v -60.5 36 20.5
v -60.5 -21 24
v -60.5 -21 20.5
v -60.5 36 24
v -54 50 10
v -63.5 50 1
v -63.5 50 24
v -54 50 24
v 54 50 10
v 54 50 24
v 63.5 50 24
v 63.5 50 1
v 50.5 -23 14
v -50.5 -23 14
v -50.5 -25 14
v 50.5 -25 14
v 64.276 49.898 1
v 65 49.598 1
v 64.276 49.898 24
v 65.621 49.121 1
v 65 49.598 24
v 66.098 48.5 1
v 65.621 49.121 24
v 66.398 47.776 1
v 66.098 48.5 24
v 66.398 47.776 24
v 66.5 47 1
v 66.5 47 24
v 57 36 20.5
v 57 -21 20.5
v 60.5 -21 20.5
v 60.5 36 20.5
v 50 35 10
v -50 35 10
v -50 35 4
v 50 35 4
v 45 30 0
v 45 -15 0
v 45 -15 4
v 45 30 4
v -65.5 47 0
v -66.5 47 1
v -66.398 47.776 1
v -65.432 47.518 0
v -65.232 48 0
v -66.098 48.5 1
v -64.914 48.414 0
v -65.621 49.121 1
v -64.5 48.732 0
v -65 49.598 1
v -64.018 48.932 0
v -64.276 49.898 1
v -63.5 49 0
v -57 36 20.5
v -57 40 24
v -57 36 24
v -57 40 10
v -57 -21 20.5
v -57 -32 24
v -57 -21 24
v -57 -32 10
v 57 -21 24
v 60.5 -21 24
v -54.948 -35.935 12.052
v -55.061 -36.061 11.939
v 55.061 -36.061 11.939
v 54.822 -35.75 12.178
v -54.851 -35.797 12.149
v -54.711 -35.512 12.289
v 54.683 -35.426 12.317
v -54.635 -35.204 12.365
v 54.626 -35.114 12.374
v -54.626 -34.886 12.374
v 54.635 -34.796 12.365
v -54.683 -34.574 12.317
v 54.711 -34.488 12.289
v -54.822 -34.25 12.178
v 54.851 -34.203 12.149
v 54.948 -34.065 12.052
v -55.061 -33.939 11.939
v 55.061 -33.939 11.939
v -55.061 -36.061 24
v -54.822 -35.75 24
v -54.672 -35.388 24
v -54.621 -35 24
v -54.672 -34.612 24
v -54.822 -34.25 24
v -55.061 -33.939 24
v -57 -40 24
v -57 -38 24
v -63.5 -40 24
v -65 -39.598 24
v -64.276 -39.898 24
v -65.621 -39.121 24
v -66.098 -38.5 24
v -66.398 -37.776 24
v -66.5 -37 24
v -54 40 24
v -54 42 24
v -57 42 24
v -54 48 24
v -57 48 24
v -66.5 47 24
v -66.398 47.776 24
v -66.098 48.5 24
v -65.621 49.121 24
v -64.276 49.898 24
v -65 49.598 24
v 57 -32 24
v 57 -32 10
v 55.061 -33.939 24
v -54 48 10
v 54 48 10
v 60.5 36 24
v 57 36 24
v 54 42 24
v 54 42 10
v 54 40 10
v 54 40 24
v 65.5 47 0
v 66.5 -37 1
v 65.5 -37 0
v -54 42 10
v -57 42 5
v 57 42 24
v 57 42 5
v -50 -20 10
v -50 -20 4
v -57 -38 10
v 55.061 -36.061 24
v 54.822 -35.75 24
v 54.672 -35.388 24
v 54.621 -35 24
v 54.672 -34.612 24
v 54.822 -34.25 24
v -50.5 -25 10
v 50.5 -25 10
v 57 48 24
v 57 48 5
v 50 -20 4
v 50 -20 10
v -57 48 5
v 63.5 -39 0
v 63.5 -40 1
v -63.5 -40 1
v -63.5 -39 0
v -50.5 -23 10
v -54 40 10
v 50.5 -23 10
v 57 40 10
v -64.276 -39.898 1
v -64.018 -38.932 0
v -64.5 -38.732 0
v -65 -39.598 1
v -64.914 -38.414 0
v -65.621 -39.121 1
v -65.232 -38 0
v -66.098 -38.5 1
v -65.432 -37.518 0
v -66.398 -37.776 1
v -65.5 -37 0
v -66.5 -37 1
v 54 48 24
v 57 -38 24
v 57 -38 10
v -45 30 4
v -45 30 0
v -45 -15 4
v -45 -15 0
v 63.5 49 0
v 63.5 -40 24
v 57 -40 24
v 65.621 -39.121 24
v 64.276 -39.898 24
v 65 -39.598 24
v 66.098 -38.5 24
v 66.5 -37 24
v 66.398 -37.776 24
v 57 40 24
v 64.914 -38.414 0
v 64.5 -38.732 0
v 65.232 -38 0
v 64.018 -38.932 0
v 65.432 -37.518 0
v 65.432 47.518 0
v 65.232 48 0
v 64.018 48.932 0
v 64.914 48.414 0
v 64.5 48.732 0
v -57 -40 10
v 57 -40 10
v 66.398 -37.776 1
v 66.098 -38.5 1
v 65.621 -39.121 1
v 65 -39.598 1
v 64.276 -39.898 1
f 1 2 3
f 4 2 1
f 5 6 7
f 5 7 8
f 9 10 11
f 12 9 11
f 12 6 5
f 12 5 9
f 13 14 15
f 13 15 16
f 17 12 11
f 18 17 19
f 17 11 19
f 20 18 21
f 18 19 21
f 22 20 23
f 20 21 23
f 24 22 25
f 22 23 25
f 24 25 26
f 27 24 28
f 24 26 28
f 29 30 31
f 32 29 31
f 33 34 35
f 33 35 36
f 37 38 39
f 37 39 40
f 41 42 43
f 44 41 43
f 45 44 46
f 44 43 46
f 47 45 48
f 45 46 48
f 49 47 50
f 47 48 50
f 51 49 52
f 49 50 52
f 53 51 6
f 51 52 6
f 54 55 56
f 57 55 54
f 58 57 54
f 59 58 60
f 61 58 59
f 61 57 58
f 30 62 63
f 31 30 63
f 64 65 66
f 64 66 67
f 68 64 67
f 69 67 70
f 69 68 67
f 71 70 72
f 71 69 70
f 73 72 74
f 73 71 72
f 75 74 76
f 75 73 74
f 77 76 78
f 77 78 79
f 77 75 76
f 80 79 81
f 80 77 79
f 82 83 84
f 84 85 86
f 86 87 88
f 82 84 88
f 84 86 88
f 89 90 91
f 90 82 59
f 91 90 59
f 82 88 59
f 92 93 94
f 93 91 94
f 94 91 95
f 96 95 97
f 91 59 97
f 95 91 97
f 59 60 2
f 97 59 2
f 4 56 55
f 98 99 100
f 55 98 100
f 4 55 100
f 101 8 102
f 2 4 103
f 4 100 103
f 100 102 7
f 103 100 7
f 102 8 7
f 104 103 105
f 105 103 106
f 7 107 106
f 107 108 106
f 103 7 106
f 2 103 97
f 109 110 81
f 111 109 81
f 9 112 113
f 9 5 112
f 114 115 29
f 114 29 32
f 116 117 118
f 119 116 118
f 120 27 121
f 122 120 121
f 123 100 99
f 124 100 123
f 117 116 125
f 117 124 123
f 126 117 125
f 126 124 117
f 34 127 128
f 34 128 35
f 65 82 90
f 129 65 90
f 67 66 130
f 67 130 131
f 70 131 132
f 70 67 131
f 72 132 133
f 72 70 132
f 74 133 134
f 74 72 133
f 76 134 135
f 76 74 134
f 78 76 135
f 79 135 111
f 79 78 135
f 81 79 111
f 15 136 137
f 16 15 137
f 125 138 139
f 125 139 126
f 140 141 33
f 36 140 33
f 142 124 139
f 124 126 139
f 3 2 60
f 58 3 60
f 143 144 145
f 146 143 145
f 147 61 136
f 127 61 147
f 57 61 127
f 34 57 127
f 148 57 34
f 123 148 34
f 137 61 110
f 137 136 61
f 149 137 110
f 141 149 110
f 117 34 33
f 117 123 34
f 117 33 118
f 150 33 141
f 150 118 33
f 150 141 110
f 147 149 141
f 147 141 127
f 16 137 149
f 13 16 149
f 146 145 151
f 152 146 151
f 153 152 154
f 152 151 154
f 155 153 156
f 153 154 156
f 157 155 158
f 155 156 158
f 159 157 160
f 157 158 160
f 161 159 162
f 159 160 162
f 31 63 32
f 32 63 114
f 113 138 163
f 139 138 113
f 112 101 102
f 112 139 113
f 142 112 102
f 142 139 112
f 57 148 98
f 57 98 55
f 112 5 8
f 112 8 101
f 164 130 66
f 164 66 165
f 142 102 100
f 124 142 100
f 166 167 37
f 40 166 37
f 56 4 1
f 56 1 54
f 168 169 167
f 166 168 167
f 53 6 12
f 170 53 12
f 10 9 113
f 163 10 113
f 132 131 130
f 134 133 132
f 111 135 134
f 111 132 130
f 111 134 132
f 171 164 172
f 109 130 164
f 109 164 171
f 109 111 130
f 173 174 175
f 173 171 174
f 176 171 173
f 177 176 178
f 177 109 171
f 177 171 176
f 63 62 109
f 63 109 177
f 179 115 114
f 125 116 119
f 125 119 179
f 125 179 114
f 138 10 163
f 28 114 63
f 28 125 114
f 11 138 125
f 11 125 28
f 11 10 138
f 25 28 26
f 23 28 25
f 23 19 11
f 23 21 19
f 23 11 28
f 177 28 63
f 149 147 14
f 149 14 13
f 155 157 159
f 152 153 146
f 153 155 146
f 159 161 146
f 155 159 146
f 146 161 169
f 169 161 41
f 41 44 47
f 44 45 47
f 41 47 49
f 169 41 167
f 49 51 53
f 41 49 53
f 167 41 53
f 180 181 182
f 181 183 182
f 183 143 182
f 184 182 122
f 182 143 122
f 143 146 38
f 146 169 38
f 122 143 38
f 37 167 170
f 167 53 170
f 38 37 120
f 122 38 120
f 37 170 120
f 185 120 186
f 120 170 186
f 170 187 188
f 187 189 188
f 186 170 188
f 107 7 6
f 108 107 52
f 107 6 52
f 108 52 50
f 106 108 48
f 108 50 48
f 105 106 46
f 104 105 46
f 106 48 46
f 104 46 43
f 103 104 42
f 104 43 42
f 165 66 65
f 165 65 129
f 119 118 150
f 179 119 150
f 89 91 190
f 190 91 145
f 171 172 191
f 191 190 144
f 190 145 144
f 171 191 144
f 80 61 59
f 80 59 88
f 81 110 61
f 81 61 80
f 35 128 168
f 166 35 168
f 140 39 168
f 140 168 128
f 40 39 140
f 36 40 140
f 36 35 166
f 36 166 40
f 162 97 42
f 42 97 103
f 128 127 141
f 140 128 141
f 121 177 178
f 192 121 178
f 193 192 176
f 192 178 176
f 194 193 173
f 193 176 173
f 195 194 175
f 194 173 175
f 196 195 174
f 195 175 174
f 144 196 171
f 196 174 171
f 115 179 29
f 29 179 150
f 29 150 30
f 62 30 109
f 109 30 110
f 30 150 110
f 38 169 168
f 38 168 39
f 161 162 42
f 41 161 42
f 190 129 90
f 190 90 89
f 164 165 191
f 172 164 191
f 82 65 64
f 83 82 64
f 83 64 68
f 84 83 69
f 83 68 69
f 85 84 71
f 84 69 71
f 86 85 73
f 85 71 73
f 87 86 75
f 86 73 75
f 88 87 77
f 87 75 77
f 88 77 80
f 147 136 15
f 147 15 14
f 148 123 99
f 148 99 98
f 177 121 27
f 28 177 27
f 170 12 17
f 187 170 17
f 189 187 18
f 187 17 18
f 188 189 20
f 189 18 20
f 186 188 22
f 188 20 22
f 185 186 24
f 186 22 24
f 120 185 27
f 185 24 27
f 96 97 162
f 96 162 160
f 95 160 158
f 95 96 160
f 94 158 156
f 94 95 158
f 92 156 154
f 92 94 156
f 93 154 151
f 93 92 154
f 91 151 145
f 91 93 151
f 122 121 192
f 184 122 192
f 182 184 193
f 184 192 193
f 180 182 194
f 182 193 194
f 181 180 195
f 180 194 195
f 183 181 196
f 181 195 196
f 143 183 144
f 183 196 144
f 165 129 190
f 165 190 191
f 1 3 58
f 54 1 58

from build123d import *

# Parameters (mm, degrees)
SKETCH_W             = 133
SKETCH_H             = 90
PAD_DEPTH            = 10
PAD001_DEPTH         = 24
PAD002_DEPTH         = 133
SKETCH003_W          = 101
SKETCH003_H          = 2
PAD003_DEPTH         = 14
SKETCH004_W          = 100
SKETCH004_H          = 55
POCKET_DEPTH         = 6
SKETCH005_W          = 90
SKETCH005_H          = 45
POCKET001_DEPTH      = 24.001
FILLET_R             = 3
FILLET001_R          = 3
CHAMFER_SIZE         = 1
SKETCH006_W          = 6
SKETCH006_H          = 6
POCKET002_DEPTH      = 57
POCKET002_DEPTH_BACK = -57
SKETCH007_W          = 3.5
SKETCH007_H          = 57
POCKET003_DEPTH      = 3.5


with BuildPart() as part:
    # Sketch → Pad (new body)
    with BuildSketch(Plane.XY):
        with Locations((0, 5)):
            Rectangle(SKETCH_W, SKETCH_H)
    extrude(amount=PAD_DEPTH)

    # Sketch001 → Pad001 (join)
    with BuildSketch(Plane.XY):
        with BuildLine():
            Line((-66.5, -40), (-66.5, 50))
            Line((-66.5, 50), (-54, 50))
            Line((-54, 50), (-54, 48))
            Line((-54, 48), (-57, 48))
            Line((-57, 48), (-57, 42))
            Line((-57, 42), (-54, 42))
            Line((-54, 42), (-54, 40))
            Line((-54, 40), (-57, 40))
            Line((-57, 40), (-57, -32))
            Line((-57, -32), (-55.06066, -33.93934))
            ThreePointArc((-55.06066, -36.06066), (-54.62132, -35), (-55.06066, -33.93934))
            Line((-55.06066, -36.06066), (-57, -38))
            Line((-57, -38), (-57, -40))
            Line((-57, -40), (-66.5, -40))
        make_face()
    pad001 = extrude(amount=PAD001_DEPTH)

    # Mirrored: Pad001 across Sketch001 V_Axis
    add(pad001.mirror(Plane(origin=(0, 0, 0), x_dir=(0, 0, 1), z_dir=(1, 0, 0))))

    # Sketch002 (on Face10 of Mirrored) → Pad002 (join)
    with BuildSketch(Plane(origin=(-66.5, 0, 0), x_dir=(0, -1, 0), z_dir=(-1, 0, 0))):
        with BuildLine():
            Line((32, 10), (33.93934, 11.93934))
            ThreePointArc((36.06066, 11.93934), (35, 12.37868), (33.93934, 11.93934))
            Line((36.06066, 11.93934), (38, 10))
            Line((38, 10), (32, 10))
        make_face()
    extrude(amount=-PAD002_DEPTH)

    # Sketch003 → Pad003 (join)
    with BuildSketch(Plane.XY):
        with Locations((0, -24)):
            Rectangle(SKETCH003_W, SKETCH003_H)
    extrude(amount=PAD003_DEPTH)

    # Sketch004 (on Face32 of Pad003) → Pocket (cut)
    with BuildSketch(Plane.XY.offset(10)):
        with Locations((0, 7.5)):
            Rectangle(SKETCH004_W, SKETCH004_H)
    extrude(amount=-POCKET_DEPTH, mode=Mode.SUBTRACT)

    # Sketch005 → Pocket001 (cut, through all)
    with BuildSketch(Plane.XY):
        with Locations((0, 7.5)):
            Rectangle(SKETCH005_W, SKETCH005_H)
    extrude(amount=POCKET001_DEPTH, mode=Mode.SUBTRACT)

    # Fillet
    fillet_edges = [part.edges().sort_by_distance(p)[0] for p in [
        (66.5, 50, 5),
        (66.5, 50, 17),
        (66.5, -40, 5),
        (66.5, -40, 17),
    ]]
    fillet(fillet_edges, radius=FILLET_R)

    # Fillet001
    fillet001_edges = [part.edges().sort_by_distance(p)[0] for p in [
        (-66.5, -40, 17),
        (-66.5, -40, 5),
        (-66.5, 50, 17),
        (-66.5, 50, 5),
    ]]
    fillet(fillet001_edges, radius=FILLET001_R)

    # Chamfer
    chamfer_edges = [part.edges().sort_by_distance(p)[0] for p in [
        (0, 50, 0),
        (-58.75, 50, 0),
        (-65.62132, 49.12132, 0),
        (-66.5, 5, 0),
        (-65.62132, -39.12132, 0),
        (-60.25, -40, 0),
        (0, -40, 0),
        (60.25, -40, 0),
        (65.62132, -39.12132, 0),
        (66.5, 5, 0),
        (65.62132, 49.12132, 0),
        (58.75, 50, 0),
    ]]
    chamfer(chamfer_edges, length=CHAMFER_SIZE)

    # Sketch006 → Pocket002 (cut, two sides)
    with BuildSketch(Plane.YZ) as pocket002_sk:
        with Locations((45, 8)):
            Rectangle(SKETCH006_W, SKETCH006_H)
    extrude(amount=-POCKET002_DEPTH, mode=Mode.SUBTRACT)
    extrude(pocket002_sk.sketch, amount=-POCKET002_DEPTH_BACK, mode=Mode.SUBTRACT)

    # Sketch007 (on Face59 of Pocket002) → Pocket003 (cut)
    with BuildSketch(Plane.XY.offset(24)):
        with Locations((58.75, 7.5)):
            Rectangle(SKETCH007_W, SKETCH007_H)
        with Locations((-58.75, 7.5)):
            Rectangle(SKETCH007_W, SKETCH007_H)
    extrude(amount=-POCKET003_DEPTH, mode=Mode.SUBTRACT)


solid = part.part
